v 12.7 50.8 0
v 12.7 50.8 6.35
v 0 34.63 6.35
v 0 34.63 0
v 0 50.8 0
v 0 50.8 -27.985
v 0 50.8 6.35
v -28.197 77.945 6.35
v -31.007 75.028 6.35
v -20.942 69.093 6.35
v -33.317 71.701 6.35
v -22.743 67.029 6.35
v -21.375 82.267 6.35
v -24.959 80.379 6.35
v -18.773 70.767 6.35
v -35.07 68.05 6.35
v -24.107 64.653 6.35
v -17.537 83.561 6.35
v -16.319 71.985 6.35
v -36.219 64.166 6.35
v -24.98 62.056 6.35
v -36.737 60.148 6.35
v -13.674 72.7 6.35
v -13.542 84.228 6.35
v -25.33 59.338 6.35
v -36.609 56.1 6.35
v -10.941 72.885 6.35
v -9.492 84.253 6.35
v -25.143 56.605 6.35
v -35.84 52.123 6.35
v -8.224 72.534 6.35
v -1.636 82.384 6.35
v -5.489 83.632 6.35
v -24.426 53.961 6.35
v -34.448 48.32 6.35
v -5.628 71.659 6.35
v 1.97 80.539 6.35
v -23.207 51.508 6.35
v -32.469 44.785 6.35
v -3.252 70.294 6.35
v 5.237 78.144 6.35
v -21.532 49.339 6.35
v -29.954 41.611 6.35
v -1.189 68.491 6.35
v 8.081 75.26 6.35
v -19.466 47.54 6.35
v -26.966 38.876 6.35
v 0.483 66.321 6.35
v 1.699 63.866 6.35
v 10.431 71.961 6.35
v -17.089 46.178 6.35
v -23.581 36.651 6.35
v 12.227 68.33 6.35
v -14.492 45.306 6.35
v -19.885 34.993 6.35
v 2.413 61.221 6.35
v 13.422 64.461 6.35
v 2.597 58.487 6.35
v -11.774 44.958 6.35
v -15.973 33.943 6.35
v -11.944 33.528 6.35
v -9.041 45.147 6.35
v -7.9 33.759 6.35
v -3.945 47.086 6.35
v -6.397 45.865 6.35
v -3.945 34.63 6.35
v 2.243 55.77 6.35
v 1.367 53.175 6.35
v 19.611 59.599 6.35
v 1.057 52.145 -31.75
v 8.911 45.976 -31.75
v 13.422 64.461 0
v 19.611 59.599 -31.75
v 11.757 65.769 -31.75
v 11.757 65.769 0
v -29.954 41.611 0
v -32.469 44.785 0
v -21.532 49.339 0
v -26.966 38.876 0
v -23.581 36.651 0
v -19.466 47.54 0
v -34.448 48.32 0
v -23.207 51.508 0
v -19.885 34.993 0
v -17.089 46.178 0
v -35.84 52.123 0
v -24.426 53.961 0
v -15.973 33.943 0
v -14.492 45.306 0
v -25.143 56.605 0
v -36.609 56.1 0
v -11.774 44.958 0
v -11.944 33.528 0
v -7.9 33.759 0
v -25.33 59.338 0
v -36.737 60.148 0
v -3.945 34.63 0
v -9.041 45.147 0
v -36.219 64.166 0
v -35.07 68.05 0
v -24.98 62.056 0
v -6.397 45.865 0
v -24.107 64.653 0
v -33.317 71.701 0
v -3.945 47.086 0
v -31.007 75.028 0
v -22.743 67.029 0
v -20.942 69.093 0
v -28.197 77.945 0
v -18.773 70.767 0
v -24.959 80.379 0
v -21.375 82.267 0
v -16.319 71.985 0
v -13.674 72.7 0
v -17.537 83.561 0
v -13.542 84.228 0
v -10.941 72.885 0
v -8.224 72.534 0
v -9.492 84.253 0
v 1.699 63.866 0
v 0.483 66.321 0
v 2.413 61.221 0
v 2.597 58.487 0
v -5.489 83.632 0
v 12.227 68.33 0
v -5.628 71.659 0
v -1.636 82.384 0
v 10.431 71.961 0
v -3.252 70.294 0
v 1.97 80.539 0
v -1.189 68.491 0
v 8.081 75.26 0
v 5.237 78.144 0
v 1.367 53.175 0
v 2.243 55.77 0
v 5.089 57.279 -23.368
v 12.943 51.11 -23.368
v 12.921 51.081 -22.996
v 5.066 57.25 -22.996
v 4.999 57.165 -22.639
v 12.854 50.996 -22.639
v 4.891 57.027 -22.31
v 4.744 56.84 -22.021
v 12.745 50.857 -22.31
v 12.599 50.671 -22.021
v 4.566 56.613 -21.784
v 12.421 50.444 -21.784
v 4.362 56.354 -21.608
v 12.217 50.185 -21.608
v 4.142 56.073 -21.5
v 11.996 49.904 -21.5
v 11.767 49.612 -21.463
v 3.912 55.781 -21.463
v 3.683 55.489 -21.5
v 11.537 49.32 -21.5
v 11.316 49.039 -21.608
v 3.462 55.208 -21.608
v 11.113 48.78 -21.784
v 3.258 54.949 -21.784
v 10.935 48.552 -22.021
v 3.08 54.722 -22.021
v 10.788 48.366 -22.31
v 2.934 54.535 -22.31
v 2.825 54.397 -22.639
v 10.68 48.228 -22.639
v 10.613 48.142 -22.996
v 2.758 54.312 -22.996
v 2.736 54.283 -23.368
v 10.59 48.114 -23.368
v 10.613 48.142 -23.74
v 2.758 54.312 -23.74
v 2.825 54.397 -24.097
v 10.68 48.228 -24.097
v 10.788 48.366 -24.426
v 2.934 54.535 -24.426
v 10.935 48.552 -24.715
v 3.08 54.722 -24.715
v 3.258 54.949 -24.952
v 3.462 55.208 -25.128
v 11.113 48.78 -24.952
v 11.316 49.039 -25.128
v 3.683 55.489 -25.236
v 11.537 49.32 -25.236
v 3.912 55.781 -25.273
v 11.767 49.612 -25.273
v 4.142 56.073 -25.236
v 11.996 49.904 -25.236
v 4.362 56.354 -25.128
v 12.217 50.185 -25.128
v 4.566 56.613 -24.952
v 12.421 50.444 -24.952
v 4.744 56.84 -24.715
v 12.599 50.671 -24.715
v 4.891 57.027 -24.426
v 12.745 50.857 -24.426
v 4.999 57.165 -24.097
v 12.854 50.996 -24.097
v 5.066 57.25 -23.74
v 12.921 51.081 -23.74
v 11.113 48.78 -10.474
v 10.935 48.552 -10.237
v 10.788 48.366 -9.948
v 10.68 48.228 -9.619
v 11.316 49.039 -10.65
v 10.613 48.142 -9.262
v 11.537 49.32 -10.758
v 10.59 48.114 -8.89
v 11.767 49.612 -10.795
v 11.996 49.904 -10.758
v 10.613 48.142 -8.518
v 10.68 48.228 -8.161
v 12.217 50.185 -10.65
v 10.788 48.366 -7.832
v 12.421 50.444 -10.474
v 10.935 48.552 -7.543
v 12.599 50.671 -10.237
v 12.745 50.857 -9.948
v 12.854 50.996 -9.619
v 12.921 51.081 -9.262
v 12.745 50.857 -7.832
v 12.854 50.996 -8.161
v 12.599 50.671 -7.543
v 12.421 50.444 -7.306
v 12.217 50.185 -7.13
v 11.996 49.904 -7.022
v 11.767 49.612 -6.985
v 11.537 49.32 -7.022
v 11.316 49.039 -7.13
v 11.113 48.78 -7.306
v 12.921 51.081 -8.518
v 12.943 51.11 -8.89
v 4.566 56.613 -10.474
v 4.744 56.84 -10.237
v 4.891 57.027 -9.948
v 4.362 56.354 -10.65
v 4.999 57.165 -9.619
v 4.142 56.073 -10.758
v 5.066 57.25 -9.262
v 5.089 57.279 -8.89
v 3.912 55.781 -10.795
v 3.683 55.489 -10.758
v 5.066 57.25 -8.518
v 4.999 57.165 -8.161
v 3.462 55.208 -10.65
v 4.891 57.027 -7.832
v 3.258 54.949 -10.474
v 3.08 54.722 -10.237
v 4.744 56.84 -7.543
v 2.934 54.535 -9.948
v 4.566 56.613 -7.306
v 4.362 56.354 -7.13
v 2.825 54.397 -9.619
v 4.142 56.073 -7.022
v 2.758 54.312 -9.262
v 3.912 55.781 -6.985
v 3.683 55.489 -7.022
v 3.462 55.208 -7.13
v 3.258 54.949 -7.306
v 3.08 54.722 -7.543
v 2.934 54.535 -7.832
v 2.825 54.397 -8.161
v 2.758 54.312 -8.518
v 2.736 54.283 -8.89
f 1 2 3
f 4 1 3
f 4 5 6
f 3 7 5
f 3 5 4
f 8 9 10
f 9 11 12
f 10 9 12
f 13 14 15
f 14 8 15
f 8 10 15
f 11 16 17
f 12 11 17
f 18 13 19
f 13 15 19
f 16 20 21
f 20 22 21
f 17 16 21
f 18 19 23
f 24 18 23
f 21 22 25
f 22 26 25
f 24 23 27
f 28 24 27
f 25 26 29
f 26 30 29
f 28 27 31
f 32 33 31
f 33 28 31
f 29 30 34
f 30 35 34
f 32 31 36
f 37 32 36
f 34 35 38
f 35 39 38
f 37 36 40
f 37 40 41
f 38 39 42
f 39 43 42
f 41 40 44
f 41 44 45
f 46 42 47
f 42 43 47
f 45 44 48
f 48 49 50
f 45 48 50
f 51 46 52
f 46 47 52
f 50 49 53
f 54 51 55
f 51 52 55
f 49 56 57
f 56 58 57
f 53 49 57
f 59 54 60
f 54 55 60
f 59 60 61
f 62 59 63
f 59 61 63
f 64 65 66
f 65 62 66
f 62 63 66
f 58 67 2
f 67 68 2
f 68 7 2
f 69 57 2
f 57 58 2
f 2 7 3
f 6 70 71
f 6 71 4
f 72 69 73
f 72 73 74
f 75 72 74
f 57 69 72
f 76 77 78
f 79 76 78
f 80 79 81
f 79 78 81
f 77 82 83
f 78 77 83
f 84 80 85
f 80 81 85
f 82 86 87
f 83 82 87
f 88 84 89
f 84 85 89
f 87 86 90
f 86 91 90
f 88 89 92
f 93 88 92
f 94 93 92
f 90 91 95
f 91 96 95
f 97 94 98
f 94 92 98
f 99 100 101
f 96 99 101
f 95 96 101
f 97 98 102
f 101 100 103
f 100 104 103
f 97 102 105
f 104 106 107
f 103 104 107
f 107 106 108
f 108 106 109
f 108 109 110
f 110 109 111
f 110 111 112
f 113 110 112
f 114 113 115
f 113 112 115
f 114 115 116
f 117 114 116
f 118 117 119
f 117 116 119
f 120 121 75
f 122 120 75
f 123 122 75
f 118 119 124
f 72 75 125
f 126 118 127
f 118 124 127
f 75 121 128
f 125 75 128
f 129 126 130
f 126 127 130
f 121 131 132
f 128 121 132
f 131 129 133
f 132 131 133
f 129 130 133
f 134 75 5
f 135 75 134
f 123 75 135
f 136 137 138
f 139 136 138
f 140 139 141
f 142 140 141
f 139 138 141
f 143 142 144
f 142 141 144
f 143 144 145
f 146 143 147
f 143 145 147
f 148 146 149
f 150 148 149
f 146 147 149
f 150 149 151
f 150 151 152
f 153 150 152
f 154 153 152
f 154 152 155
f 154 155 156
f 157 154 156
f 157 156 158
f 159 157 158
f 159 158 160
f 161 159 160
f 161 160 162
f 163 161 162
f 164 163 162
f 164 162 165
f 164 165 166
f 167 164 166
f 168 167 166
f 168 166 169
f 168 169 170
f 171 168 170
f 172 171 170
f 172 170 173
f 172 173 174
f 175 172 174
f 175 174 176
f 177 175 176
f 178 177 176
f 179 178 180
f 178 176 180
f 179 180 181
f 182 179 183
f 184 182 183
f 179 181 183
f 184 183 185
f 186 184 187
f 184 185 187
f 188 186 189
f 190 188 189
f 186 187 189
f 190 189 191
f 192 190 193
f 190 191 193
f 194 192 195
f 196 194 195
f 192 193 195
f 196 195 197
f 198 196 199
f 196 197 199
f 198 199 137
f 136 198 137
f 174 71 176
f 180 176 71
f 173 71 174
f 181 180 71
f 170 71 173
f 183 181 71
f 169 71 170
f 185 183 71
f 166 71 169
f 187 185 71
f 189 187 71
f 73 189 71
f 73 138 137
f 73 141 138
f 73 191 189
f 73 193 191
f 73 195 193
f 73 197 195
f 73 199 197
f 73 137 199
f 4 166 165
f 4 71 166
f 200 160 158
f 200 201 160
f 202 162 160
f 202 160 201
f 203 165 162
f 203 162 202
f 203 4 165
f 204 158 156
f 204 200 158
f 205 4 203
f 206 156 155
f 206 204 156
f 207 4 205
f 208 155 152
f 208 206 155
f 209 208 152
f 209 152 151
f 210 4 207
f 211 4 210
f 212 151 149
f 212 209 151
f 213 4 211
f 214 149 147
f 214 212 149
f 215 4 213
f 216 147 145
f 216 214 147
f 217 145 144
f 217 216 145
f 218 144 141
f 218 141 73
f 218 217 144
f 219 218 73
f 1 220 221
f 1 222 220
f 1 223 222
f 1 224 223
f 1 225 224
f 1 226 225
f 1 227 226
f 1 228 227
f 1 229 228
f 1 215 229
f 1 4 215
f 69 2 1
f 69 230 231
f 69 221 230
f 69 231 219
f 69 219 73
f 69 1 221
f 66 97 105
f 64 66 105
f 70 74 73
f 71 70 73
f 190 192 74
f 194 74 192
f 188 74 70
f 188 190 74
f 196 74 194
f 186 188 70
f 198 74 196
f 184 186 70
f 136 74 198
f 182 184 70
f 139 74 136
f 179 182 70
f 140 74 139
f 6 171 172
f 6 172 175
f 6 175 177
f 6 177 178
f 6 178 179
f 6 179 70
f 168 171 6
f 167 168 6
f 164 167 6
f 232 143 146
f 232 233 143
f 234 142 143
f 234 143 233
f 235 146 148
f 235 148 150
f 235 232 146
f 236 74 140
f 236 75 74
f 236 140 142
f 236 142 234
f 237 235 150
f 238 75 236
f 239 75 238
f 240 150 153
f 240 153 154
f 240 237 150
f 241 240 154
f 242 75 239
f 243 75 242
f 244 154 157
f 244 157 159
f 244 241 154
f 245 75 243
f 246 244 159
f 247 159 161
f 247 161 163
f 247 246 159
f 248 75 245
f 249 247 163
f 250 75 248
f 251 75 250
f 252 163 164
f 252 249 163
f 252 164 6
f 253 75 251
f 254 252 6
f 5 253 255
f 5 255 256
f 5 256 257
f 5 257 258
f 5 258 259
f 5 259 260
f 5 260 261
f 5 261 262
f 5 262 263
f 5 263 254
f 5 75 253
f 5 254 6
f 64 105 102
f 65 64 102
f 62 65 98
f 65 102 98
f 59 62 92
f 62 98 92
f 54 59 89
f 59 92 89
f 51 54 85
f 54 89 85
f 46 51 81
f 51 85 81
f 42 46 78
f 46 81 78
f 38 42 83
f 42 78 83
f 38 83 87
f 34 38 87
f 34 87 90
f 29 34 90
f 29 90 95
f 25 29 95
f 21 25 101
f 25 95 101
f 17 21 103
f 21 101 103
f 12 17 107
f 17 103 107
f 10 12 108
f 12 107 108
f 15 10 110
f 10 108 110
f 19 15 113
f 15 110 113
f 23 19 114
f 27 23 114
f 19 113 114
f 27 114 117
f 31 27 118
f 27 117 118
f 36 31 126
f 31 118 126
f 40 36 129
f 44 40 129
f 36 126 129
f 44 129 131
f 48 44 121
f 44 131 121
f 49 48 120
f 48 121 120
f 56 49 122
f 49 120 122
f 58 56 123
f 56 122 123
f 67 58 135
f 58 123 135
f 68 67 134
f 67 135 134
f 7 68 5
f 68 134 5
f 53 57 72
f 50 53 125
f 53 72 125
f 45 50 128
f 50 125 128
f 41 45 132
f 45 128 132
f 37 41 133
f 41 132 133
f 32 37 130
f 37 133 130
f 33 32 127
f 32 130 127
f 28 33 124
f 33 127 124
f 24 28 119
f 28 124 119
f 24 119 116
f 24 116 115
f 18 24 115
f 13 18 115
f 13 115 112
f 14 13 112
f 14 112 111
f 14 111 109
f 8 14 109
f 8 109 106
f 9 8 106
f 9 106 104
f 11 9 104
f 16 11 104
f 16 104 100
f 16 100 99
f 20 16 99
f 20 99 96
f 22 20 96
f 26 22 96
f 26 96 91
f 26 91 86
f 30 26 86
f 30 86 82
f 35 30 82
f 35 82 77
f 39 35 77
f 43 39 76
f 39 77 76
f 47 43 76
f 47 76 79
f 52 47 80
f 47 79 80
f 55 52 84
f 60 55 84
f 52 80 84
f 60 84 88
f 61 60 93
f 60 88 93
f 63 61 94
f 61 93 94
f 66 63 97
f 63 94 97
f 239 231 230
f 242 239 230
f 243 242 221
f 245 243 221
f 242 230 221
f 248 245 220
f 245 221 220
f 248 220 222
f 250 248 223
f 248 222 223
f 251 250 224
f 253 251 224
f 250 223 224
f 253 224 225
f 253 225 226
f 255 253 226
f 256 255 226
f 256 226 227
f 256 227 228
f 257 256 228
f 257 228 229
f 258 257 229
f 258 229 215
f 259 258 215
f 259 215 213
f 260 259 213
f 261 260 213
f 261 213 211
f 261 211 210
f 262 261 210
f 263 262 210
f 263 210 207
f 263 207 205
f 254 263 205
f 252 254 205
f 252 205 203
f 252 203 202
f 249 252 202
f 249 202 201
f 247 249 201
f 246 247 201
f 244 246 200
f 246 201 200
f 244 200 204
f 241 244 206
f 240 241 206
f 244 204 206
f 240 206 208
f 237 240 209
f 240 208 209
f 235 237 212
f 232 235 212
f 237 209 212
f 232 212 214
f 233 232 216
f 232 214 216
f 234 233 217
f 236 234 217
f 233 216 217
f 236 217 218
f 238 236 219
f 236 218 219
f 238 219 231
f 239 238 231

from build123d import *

# Parameters (mm, degrees)
F1_DEPTH      = 6.35
F2_W          = 25.4
F2_H          = 7.62
F3_DEPTH      = 50.8
F3_DEPTH_BACK = 6.35
F4_R          = 1.905
F5_DEPTH      = 25.4
F6_W          = 25.4
F6_H          = 12.7
F7_DEPTH      = 25.4
F9_DEPTH      = 50.8
F11_DEPTH     = 38.1
F12_R         = 1.905
F13_DEPTH     = 25.4
F15_DEPTH     = 25.4


with BuildPart() as f1:
    # F0 (on Top) → F1 (new body)
    with BuildSketch(Plane.XY):
        with BuildLine():
            Line((0, 50.8), (0, 0))
            Line((0, 0), (12.7, 0))
            Line((12.7, 0), (12.7, 50.8))
            ThreePointArc((12.7, 50.8), (-29.065215599, 77.1403437723), (-3.9445899309, 34.6303318914))
            Line((-3.9445899309, 34.6303318914), (-3.9445899309, 47.0864193681))
            ThreePointArc((-3.9445899309, 47.0864193681), (-20.9424468727, 69.0934306211), (0, 50.8))
        make_face()
    extrude(amount=F1_DEPTH)

    # F2 (on face) → F3 (join, two sides)
    with BuildSketch(Plane(origin=(0, 0, 0), x_dir=(1, 0, 0), z_dir=(0, 0, -1))) as f3_sk:
        with Locations((6.35, -3.81)):
            Rectangle(F2_W, F2_H)
    extrude(amount=F3_DEPTH)
    extrude(f3_sk.sketch, amount=-F3_DEPTH_BACK)

    # F4 (on face) → F5 (cut)
    with BuildSketch(Plane.XZ):
        with Locations((6.35, -8.89)):
            Circle(F4_R)
        with Locations((6.35, -23.368)):
            Circle(F4_R)
    extrude(amount=-F5_DEPTH, mode=Mode.SUBTRACT)

    # F6 (on face) → F7 (cut)
    with BuildSketch(Plane(origin=(0, 7.62, 0), x_dir=(-1, 0, 0), z_dir=(0, 1, 0))):
        with Locations((-6.35, -44.45)):
            Rectangle(F6_W, F6_H)
    extrude(amount=-F7_DEPTH, mode=Mode.SUBTRACT)

    # F8 (on face) → F9 (cut)
    with BuildSketch(Plane.XY.offset(6.35)):
        Polygon((12.7, 50.8), (0, 34.6303318914), (0, 17.3151659457), (-24.9700341374, 14.0488371253), (-24.9700341374, -25.5910921842), (41.8248102069, -22.4698372185), (37.4550558627, 0), (37.4550558627, 34.6303318914), align=None)
    extrude(amount=-F9_DEPTH, mode=Mode.SUBTRACT)

    # F10 (on face) → F11 (join)
    with BuildSketch(Plane.XY.offset(6.35)):
        Polygon((0, 50.8), (0, 34.6303318914), (19.6113090693, 59.5994940036), (11.7567067815, 65.7686650951), align=None)
    extrude(amount=-F11_DEPTH)

    # F12 (on face) → F13 (cut)
    with BuildSketch(Plane(origin=(-16.8220820781, 13.2124197576, 0), x_dir=(0.6176790258, 0.7864303027, 0), z_dir=(0.7864303027, -0.6176790258, 0))):
        with Locations((46.2843423936, -8.89)):
            Circle(F12_R)
        with Locations((46.2843423936, -23.368)):
            Circle(F12_R)
    extrude(amount=-F13_DEPTH, mode=Mode.SUBTRACT)

    # F14 (on face) → F15 (cut)
    with BuildSketch(Plane(origin=(-16.8220820781, 13.2124197576, 0), x_dir=(0.6176790258, 0.7864303027, 0), z_dir=(0.7864303027, -0.6176790258, 0))):
        Polygon((27.2343423936, -31.75), (41.6614189744, -31.75), (27.2343423936, 0), align=None)
    extrude(amount=-F15_DEPTH, mode=Mode.SUBTRACT)


solid = f1.part
